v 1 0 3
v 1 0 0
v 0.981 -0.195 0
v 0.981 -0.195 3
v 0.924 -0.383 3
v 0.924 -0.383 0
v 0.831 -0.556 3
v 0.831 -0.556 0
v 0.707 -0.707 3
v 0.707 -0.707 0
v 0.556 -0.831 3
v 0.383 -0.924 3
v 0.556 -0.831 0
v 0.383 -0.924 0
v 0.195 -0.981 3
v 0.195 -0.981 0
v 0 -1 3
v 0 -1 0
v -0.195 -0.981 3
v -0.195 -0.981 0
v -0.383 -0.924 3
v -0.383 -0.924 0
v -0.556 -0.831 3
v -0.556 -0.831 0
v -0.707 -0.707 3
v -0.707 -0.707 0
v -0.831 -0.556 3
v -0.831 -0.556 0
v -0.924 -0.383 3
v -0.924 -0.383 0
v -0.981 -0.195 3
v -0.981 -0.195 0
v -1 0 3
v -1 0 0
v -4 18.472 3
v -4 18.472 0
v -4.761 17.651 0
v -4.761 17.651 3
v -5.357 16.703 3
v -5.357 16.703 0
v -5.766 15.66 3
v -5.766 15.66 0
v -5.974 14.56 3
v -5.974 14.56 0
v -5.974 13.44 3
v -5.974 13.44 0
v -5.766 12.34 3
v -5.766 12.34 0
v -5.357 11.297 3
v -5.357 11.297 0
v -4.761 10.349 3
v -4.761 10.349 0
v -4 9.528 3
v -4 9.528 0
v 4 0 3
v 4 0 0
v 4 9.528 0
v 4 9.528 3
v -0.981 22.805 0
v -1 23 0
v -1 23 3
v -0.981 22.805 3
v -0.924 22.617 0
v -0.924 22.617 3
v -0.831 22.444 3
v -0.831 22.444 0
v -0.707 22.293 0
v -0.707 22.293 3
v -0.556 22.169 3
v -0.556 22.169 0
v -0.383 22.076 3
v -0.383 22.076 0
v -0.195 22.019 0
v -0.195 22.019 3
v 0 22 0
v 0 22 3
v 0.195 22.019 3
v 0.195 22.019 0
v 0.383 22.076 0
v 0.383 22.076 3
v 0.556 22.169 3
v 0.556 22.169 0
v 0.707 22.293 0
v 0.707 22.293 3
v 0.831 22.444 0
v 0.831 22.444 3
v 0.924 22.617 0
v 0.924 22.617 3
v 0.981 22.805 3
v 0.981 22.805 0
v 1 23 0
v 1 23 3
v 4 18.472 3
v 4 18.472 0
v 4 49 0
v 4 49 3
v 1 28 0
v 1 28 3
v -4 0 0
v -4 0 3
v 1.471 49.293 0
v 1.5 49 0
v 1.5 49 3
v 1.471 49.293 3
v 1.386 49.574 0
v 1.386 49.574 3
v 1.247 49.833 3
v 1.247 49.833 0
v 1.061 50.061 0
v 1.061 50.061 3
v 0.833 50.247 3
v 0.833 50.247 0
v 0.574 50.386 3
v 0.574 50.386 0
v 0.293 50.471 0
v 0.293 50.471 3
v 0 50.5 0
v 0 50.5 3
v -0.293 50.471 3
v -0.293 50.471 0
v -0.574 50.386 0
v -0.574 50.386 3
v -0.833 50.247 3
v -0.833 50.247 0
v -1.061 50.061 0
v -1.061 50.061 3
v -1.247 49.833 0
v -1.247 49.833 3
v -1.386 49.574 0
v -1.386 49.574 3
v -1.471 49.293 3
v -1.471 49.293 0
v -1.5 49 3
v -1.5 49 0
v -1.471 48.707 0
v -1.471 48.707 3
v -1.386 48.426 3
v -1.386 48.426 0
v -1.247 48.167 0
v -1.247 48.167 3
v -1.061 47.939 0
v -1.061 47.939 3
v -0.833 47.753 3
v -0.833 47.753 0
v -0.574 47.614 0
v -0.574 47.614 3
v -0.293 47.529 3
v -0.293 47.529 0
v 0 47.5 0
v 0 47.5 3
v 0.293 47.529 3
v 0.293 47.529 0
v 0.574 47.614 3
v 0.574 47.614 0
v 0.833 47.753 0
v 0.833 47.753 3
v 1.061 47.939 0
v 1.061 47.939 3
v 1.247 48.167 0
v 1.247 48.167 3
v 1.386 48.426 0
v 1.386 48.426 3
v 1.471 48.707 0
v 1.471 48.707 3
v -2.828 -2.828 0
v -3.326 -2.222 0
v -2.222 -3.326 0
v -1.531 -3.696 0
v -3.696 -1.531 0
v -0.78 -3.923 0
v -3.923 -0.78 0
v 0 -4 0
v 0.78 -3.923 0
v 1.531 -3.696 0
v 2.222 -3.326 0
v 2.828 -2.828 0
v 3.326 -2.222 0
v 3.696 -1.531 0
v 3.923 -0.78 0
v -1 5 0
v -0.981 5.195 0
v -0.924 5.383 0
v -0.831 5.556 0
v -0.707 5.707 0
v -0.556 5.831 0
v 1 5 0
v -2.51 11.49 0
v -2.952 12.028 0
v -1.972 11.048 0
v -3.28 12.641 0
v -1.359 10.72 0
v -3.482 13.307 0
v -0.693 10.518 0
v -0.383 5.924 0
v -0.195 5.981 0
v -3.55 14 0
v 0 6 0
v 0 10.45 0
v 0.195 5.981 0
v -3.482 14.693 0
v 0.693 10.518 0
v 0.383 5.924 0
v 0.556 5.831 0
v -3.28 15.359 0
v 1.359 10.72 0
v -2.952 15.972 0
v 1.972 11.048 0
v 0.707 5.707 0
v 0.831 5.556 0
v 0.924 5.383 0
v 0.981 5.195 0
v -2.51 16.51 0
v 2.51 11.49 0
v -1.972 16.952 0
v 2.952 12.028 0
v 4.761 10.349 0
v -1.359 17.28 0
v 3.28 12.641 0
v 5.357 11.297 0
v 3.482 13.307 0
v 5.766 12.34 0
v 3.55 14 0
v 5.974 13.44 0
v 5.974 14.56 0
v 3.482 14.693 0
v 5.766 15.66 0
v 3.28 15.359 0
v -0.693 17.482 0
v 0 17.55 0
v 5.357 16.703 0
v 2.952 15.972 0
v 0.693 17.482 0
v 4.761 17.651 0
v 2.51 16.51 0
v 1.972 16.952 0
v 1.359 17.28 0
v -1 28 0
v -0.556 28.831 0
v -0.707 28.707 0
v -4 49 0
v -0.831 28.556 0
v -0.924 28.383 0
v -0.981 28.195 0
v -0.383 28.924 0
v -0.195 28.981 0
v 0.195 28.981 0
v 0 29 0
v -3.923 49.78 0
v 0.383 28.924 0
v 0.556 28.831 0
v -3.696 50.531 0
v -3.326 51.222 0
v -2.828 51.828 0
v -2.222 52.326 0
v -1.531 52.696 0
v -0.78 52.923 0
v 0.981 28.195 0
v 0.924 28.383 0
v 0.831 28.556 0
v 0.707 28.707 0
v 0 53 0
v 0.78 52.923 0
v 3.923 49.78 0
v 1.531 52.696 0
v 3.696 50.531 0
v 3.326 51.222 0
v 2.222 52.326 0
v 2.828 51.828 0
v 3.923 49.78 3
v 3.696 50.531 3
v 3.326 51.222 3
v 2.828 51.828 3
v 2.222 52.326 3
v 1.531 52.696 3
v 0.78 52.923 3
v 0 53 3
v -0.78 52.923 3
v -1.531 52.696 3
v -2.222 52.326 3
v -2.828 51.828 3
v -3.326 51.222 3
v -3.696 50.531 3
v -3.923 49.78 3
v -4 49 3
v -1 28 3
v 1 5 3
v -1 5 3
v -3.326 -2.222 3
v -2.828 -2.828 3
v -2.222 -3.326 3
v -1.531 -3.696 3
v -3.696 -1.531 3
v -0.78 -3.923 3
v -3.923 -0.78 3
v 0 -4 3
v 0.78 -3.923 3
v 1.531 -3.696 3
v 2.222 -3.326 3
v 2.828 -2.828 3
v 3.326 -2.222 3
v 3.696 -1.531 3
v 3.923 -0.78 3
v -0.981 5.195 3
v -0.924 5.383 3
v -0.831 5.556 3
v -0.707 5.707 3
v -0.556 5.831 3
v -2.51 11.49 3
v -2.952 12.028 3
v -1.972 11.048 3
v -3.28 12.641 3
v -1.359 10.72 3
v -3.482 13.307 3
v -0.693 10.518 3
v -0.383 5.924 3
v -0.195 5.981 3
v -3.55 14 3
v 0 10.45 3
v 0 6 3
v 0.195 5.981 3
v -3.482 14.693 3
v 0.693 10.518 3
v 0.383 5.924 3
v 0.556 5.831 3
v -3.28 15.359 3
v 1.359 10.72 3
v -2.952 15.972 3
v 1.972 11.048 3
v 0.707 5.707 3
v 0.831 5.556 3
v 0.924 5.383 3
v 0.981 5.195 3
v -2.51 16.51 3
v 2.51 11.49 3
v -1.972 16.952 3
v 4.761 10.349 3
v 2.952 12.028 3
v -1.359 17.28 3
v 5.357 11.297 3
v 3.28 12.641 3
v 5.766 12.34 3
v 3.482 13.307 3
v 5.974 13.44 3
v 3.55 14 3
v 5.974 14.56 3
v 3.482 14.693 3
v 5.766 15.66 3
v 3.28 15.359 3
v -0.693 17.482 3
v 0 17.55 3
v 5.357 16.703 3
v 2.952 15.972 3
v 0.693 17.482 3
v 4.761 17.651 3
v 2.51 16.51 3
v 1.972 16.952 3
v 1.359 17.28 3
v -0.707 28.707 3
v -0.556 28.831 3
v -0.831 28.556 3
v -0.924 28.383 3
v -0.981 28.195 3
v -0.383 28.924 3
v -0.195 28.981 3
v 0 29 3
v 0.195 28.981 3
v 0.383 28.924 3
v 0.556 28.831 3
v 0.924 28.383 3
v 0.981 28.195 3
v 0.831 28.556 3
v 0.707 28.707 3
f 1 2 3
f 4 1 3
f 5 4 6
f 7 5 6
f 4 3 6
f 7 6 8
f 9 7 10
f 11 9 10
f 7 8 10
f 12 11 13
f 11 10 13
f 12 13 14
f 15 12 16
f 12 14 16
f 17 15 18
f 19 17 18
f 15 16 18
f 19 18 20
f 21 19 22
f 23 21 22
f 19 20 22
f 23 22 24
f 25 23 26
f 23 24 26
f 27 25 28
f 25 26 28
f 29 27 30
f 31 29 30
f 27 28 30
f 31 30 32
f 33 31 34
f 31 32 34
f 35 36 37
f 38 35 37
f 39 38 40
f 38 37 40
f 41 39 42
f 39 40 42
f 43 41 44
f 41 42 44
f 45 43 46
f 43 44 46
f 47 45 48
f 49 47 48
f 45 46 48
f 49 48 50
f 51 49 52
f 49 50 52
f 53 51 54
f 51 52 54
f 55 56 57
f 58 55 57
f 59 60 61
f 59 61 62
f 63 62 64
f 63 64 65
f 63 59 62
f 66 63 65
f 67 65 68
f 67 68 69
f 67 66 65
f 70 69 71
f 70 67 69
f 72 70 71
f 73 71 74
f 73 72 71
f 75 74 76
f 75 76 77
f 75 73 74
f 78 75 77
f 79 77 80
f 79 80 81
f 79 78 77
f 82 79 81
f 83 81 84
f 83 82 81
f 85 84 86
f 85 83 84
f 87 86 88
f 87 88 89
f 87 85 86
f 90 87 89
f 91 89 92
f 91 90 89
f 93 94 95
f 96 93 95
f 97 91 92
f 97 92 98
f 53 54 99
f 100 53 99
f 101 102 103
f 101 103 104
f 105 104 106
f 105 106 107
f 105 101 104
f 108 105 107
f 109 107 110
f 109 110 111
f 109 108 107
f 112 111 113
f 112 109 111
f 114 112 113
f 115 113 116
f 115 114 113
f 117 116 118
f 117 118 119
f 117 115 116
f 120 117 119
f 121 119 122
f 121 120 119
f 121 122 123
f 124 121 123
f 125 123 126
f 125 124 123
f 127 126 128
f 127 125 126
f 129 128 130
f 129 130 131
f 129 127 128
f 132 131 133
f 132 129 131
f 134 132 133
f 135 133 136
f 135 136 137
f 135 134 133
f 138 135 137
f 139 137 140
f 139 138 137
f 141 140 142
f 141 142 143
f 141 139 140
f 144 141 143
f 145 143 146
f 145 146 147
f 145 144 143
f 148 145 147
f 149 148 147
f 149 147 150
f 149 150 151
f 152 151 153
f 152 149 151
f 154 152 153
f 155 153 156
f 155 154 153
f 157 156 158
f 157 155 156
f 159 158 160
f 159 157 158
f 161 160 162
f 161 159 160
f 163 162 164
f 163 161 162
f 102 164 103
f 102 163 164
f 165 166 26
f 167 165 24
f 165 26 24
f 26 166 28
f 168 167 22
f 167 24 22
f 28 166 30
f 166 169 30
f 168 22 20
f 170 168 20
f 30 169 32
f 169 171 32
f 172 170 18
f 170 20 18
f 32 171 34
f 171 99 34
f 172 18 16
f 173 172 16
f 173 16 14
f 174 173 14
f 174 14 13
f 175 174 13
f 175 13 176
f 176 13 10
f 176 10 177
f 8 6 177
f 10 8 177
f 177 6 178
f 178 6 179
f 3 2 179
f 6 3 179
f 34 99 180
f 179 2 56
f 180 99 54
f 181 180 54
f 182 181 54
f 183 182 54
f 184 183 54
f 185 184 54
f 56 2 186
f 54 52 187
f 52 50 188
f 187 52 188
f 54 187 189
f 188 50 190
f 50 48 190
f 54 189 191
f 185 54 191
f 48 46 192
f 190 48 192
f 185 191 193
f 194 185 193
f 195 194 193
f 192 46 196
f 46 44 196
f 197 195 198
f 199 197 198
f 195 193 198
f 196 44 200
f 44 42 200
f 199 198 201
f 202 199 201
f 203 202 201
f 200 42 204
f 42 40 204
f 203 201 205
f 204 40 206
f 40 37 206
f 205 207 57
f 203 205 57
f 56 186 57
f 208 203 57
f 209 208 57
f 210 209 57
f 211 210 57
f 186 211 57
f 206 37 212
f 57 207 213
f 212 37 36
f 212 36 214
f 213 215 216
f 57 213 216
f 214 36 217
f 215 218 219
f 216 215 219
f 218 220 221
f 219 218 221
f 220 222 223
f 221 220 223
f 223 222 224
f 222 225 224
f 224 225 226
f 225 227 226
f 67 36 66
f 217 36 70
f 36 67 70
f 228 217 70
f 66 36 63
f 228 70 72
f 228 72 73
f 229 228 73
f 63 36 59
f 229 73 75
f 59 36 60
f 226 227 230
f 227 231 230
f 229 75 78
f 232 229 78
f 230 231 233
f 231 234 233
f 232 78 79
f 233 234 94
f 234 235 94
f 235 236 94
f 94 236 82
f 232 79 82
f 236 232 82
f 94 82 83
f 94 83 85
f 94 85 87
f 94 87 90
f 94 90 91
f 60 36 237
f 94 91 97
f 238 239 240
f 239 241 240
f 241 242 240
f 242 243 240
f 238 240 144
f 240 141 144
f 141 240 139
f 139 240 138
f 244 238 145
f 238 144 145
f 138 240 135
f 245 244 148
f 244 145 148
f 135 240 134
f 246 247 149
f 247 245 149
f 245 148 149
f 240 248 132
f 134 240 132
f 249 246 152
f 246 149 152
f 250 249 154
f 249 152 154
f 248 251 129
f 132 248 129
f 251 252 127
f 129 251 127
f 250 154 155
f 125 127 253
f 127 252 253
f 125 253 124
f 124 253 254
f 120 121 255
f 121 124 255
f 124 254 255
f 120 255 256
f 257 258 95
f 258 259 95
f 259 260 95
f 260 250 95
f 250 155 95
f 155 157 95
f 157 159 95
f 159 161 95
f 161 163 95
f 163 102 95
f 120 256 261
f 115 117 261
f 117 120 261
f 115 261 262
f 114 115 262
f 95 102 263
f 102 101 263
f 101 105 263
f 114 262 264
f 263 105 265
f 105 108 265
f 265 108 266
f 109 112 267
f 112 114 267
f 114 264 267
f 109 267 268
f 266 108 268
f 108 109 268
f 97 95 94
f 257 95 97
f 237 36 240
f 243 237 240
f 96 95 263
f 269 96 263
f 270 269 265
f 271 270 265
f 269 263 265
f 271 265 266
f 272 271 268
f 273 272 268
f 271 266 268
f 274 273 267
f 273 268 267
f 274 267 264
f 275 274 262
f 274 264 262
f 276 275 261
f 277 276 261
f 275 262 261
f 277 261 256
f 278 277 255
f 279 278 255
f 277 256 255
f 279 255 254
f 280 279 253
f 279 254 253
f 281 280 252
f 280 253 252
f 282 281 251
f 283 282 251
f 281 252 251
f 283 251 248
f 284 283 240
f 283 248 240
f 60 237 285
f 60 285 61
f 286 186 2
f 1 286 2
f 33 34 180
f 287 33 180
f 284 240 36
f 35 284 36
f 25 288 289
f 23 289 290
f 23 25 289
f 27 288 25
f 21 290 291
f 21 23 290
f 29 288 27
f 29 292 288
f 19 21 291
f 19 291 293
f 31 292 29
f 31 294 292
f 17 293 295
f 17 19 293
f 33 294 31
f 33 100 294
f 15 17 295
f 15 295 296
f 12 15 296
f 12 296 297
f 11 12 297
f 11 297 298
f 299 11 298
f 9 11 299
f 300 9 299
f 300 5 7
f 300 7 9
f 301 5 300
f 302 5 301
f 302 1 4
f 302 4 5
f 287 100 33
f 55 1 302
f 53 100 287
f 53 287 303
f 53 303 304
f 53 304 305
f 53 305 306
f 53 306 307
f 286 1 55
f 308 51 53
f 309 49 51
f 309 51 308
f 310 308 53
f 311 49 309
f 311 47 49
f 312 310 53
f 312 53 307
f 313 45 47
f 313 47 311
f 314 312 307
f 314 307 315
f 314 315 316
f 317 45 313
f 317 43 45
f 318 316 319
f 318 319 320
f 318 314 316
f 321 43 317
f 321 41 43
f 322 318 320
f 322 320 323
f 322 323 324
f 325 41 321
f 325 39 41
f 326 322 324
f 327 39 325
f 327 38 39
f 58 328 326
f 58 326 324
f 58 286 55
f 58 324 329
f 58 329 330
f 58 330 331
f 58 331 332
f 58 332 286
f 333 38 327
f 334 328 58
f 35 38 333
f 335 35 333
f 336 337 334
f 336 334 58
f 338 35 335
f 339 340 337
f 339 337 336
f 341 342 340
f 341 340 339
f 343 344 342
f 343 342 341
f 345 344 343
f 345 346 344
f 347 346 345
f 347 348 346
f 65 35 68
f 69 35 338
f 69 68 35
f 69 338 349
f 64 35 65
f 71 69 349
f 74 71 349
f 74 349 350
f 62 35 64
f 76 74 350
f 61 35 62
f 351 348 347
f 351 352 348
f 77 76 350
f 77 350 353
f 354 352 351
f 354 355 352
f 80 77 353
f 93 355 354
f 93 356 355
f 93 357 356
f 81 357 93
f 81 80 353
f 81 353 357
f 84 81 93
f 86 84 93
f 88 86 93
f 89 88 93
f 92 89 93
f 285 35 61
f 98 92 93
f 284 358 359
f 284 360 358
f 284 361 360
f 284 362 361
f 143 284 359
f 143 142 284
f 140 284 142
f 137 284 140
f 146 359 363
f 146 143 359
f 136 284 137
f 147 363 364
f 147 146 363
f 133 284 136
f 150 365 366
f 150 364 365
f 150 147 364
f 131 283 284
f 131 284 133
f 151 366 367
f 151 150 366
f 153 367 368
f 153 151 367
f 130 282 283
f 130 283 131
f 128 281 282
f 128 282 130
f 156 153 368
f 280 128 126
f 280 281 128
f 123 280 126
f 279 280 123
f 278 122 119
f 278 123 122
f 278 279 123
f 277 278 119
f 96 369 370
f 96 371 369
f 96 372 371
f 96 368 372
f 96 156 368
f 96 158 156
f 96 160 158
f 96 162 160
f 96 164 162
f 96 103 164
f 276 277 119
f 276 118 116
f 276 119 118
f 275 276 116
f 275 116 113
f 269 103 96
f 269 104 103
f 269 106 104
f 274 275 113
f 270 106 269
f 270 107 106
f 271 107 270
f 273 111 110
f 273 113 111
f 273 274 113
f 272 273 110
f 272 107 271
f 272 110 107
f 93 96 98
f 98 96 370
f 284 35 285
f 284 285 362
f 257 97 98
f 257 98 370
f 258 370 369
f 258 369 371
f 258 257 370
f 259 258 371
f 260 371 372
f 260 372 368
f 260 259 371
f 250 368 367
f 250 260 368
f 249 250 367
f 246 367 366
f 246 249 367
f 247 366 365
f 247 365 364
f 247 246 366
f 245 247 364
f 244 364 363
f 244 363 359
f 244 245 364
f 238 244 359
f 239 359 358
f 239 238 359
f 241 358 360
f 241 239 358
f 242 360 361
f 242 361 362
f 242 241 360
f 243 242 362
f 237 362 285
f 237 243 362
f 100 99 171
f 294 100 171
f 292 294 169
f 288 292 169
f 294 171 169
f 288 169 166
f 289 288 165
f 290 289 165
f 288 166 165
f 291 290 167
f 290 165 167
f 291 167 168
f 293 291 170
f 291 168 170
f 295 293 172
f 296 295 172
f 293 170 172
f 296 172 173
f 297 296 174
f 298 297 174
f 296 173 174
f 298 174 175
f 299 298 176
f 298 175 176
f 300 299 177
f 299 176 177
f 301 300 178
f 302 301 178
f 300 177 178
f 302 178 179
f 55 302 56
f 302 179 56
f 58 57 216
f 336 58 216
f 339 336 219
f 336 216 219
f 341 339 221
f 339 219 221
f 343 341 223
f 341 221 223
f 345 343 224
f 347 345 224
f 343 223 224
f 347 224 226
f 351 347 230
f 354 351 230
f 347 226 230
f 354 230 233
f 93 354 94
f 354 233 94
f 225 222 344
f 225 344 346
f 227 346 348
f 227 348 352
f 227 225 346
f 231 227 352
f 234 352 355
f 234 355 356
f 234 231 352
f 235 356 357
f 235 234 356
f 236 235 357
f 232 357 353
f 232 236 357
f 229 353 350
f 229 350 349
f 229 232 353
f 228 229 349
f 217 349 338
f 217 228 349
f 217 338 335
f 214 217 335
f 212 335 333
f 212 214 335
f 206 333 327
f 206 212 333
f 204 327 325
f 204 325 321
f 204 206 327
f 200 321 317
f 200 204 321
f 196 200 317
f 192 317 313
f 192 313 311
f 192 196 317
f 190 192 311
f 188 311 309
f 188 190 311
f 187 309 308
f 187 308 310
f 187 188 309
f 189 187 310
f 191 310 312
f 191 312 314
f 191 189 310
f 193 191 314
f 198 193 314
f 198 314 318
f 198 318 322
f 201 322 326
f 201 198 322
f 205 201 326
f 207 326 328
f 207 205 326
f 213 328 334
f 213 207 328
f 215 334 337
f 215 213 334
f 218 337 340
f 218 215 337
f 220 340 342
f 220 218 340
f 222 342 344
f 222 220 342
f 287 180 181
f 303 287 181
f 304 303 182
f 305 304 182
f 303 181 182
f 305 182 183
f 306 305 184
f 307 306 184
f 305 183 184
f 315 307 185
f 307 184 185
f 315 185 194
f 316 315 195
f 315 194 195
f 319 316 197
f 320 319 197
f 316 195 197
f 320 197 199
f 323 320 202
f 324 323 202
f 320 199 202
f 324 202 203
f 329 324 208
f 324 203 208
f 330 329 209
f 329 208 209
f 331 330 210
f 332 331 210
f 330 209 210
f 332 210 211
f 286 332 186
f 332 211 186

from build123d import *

# Parameters (mm, degrees)
SKETCH1_R           = 3.55
SKETCH1_R_2         = 1.5
BOSS_EXTRUDE1_DEPTH = 3


with BuildPart() as part:
    # Sketch1 → Boss-Extrude1 (new body)
    with BuildSketch(Plane.XY):
        with BuildLine():
            Line((4, 0), (4, 9.527864045))
            ThreePointArc((4, 9.527864045), (6, 14), (4, 18.472135955))
            Line((4, 18.472135955), (4, 49))
            ThreePointArc((4, 49), (0, 53), (-4, 49))
            Line((-4, 49), (-4, 18.472135955))
            ThreePointArc((-4, 18.472135955), (-6, 14), (-4, 9.527864045))
            Line((-4, 9.527864045), (-4, 0))
            ThreePointArc((-4, 0), (0, -4), (4, 0))
        make_face()
        with Locations((0, 14)):
            Circle(SKETCH1_R, mode=Mode.SUBTRACT)
        with Locations((0, 49)):
            Circle(SKETCH1_R_2, mode=Mode.SUBTRACT)
        with BuildLine():
            Line((-1, 0), (-1, 5))
            ThreePointArc((-1, 5), (0, 6), (1, 5))
            Line((1, 5), (1, 0))
            ThreePointArc((1, 0), (0, -1), (-1, 0))
        make_face(mode=Mode.SUBTRACT)
        with BuildLine():
            Line((-1, 28), (-1, 23))
            ThreePointArc((-1, 23), (0, 22), (1, 23))
            Line((1, 23), (1, 28))
            ThreePointArc((1, 28), (0, 29), (-1, 28))
        make_face(mode=Mode.SUBTRACT)
    extrude(amount=BOSS_EXTRUDE1_DEPTH)


solid = part.part
